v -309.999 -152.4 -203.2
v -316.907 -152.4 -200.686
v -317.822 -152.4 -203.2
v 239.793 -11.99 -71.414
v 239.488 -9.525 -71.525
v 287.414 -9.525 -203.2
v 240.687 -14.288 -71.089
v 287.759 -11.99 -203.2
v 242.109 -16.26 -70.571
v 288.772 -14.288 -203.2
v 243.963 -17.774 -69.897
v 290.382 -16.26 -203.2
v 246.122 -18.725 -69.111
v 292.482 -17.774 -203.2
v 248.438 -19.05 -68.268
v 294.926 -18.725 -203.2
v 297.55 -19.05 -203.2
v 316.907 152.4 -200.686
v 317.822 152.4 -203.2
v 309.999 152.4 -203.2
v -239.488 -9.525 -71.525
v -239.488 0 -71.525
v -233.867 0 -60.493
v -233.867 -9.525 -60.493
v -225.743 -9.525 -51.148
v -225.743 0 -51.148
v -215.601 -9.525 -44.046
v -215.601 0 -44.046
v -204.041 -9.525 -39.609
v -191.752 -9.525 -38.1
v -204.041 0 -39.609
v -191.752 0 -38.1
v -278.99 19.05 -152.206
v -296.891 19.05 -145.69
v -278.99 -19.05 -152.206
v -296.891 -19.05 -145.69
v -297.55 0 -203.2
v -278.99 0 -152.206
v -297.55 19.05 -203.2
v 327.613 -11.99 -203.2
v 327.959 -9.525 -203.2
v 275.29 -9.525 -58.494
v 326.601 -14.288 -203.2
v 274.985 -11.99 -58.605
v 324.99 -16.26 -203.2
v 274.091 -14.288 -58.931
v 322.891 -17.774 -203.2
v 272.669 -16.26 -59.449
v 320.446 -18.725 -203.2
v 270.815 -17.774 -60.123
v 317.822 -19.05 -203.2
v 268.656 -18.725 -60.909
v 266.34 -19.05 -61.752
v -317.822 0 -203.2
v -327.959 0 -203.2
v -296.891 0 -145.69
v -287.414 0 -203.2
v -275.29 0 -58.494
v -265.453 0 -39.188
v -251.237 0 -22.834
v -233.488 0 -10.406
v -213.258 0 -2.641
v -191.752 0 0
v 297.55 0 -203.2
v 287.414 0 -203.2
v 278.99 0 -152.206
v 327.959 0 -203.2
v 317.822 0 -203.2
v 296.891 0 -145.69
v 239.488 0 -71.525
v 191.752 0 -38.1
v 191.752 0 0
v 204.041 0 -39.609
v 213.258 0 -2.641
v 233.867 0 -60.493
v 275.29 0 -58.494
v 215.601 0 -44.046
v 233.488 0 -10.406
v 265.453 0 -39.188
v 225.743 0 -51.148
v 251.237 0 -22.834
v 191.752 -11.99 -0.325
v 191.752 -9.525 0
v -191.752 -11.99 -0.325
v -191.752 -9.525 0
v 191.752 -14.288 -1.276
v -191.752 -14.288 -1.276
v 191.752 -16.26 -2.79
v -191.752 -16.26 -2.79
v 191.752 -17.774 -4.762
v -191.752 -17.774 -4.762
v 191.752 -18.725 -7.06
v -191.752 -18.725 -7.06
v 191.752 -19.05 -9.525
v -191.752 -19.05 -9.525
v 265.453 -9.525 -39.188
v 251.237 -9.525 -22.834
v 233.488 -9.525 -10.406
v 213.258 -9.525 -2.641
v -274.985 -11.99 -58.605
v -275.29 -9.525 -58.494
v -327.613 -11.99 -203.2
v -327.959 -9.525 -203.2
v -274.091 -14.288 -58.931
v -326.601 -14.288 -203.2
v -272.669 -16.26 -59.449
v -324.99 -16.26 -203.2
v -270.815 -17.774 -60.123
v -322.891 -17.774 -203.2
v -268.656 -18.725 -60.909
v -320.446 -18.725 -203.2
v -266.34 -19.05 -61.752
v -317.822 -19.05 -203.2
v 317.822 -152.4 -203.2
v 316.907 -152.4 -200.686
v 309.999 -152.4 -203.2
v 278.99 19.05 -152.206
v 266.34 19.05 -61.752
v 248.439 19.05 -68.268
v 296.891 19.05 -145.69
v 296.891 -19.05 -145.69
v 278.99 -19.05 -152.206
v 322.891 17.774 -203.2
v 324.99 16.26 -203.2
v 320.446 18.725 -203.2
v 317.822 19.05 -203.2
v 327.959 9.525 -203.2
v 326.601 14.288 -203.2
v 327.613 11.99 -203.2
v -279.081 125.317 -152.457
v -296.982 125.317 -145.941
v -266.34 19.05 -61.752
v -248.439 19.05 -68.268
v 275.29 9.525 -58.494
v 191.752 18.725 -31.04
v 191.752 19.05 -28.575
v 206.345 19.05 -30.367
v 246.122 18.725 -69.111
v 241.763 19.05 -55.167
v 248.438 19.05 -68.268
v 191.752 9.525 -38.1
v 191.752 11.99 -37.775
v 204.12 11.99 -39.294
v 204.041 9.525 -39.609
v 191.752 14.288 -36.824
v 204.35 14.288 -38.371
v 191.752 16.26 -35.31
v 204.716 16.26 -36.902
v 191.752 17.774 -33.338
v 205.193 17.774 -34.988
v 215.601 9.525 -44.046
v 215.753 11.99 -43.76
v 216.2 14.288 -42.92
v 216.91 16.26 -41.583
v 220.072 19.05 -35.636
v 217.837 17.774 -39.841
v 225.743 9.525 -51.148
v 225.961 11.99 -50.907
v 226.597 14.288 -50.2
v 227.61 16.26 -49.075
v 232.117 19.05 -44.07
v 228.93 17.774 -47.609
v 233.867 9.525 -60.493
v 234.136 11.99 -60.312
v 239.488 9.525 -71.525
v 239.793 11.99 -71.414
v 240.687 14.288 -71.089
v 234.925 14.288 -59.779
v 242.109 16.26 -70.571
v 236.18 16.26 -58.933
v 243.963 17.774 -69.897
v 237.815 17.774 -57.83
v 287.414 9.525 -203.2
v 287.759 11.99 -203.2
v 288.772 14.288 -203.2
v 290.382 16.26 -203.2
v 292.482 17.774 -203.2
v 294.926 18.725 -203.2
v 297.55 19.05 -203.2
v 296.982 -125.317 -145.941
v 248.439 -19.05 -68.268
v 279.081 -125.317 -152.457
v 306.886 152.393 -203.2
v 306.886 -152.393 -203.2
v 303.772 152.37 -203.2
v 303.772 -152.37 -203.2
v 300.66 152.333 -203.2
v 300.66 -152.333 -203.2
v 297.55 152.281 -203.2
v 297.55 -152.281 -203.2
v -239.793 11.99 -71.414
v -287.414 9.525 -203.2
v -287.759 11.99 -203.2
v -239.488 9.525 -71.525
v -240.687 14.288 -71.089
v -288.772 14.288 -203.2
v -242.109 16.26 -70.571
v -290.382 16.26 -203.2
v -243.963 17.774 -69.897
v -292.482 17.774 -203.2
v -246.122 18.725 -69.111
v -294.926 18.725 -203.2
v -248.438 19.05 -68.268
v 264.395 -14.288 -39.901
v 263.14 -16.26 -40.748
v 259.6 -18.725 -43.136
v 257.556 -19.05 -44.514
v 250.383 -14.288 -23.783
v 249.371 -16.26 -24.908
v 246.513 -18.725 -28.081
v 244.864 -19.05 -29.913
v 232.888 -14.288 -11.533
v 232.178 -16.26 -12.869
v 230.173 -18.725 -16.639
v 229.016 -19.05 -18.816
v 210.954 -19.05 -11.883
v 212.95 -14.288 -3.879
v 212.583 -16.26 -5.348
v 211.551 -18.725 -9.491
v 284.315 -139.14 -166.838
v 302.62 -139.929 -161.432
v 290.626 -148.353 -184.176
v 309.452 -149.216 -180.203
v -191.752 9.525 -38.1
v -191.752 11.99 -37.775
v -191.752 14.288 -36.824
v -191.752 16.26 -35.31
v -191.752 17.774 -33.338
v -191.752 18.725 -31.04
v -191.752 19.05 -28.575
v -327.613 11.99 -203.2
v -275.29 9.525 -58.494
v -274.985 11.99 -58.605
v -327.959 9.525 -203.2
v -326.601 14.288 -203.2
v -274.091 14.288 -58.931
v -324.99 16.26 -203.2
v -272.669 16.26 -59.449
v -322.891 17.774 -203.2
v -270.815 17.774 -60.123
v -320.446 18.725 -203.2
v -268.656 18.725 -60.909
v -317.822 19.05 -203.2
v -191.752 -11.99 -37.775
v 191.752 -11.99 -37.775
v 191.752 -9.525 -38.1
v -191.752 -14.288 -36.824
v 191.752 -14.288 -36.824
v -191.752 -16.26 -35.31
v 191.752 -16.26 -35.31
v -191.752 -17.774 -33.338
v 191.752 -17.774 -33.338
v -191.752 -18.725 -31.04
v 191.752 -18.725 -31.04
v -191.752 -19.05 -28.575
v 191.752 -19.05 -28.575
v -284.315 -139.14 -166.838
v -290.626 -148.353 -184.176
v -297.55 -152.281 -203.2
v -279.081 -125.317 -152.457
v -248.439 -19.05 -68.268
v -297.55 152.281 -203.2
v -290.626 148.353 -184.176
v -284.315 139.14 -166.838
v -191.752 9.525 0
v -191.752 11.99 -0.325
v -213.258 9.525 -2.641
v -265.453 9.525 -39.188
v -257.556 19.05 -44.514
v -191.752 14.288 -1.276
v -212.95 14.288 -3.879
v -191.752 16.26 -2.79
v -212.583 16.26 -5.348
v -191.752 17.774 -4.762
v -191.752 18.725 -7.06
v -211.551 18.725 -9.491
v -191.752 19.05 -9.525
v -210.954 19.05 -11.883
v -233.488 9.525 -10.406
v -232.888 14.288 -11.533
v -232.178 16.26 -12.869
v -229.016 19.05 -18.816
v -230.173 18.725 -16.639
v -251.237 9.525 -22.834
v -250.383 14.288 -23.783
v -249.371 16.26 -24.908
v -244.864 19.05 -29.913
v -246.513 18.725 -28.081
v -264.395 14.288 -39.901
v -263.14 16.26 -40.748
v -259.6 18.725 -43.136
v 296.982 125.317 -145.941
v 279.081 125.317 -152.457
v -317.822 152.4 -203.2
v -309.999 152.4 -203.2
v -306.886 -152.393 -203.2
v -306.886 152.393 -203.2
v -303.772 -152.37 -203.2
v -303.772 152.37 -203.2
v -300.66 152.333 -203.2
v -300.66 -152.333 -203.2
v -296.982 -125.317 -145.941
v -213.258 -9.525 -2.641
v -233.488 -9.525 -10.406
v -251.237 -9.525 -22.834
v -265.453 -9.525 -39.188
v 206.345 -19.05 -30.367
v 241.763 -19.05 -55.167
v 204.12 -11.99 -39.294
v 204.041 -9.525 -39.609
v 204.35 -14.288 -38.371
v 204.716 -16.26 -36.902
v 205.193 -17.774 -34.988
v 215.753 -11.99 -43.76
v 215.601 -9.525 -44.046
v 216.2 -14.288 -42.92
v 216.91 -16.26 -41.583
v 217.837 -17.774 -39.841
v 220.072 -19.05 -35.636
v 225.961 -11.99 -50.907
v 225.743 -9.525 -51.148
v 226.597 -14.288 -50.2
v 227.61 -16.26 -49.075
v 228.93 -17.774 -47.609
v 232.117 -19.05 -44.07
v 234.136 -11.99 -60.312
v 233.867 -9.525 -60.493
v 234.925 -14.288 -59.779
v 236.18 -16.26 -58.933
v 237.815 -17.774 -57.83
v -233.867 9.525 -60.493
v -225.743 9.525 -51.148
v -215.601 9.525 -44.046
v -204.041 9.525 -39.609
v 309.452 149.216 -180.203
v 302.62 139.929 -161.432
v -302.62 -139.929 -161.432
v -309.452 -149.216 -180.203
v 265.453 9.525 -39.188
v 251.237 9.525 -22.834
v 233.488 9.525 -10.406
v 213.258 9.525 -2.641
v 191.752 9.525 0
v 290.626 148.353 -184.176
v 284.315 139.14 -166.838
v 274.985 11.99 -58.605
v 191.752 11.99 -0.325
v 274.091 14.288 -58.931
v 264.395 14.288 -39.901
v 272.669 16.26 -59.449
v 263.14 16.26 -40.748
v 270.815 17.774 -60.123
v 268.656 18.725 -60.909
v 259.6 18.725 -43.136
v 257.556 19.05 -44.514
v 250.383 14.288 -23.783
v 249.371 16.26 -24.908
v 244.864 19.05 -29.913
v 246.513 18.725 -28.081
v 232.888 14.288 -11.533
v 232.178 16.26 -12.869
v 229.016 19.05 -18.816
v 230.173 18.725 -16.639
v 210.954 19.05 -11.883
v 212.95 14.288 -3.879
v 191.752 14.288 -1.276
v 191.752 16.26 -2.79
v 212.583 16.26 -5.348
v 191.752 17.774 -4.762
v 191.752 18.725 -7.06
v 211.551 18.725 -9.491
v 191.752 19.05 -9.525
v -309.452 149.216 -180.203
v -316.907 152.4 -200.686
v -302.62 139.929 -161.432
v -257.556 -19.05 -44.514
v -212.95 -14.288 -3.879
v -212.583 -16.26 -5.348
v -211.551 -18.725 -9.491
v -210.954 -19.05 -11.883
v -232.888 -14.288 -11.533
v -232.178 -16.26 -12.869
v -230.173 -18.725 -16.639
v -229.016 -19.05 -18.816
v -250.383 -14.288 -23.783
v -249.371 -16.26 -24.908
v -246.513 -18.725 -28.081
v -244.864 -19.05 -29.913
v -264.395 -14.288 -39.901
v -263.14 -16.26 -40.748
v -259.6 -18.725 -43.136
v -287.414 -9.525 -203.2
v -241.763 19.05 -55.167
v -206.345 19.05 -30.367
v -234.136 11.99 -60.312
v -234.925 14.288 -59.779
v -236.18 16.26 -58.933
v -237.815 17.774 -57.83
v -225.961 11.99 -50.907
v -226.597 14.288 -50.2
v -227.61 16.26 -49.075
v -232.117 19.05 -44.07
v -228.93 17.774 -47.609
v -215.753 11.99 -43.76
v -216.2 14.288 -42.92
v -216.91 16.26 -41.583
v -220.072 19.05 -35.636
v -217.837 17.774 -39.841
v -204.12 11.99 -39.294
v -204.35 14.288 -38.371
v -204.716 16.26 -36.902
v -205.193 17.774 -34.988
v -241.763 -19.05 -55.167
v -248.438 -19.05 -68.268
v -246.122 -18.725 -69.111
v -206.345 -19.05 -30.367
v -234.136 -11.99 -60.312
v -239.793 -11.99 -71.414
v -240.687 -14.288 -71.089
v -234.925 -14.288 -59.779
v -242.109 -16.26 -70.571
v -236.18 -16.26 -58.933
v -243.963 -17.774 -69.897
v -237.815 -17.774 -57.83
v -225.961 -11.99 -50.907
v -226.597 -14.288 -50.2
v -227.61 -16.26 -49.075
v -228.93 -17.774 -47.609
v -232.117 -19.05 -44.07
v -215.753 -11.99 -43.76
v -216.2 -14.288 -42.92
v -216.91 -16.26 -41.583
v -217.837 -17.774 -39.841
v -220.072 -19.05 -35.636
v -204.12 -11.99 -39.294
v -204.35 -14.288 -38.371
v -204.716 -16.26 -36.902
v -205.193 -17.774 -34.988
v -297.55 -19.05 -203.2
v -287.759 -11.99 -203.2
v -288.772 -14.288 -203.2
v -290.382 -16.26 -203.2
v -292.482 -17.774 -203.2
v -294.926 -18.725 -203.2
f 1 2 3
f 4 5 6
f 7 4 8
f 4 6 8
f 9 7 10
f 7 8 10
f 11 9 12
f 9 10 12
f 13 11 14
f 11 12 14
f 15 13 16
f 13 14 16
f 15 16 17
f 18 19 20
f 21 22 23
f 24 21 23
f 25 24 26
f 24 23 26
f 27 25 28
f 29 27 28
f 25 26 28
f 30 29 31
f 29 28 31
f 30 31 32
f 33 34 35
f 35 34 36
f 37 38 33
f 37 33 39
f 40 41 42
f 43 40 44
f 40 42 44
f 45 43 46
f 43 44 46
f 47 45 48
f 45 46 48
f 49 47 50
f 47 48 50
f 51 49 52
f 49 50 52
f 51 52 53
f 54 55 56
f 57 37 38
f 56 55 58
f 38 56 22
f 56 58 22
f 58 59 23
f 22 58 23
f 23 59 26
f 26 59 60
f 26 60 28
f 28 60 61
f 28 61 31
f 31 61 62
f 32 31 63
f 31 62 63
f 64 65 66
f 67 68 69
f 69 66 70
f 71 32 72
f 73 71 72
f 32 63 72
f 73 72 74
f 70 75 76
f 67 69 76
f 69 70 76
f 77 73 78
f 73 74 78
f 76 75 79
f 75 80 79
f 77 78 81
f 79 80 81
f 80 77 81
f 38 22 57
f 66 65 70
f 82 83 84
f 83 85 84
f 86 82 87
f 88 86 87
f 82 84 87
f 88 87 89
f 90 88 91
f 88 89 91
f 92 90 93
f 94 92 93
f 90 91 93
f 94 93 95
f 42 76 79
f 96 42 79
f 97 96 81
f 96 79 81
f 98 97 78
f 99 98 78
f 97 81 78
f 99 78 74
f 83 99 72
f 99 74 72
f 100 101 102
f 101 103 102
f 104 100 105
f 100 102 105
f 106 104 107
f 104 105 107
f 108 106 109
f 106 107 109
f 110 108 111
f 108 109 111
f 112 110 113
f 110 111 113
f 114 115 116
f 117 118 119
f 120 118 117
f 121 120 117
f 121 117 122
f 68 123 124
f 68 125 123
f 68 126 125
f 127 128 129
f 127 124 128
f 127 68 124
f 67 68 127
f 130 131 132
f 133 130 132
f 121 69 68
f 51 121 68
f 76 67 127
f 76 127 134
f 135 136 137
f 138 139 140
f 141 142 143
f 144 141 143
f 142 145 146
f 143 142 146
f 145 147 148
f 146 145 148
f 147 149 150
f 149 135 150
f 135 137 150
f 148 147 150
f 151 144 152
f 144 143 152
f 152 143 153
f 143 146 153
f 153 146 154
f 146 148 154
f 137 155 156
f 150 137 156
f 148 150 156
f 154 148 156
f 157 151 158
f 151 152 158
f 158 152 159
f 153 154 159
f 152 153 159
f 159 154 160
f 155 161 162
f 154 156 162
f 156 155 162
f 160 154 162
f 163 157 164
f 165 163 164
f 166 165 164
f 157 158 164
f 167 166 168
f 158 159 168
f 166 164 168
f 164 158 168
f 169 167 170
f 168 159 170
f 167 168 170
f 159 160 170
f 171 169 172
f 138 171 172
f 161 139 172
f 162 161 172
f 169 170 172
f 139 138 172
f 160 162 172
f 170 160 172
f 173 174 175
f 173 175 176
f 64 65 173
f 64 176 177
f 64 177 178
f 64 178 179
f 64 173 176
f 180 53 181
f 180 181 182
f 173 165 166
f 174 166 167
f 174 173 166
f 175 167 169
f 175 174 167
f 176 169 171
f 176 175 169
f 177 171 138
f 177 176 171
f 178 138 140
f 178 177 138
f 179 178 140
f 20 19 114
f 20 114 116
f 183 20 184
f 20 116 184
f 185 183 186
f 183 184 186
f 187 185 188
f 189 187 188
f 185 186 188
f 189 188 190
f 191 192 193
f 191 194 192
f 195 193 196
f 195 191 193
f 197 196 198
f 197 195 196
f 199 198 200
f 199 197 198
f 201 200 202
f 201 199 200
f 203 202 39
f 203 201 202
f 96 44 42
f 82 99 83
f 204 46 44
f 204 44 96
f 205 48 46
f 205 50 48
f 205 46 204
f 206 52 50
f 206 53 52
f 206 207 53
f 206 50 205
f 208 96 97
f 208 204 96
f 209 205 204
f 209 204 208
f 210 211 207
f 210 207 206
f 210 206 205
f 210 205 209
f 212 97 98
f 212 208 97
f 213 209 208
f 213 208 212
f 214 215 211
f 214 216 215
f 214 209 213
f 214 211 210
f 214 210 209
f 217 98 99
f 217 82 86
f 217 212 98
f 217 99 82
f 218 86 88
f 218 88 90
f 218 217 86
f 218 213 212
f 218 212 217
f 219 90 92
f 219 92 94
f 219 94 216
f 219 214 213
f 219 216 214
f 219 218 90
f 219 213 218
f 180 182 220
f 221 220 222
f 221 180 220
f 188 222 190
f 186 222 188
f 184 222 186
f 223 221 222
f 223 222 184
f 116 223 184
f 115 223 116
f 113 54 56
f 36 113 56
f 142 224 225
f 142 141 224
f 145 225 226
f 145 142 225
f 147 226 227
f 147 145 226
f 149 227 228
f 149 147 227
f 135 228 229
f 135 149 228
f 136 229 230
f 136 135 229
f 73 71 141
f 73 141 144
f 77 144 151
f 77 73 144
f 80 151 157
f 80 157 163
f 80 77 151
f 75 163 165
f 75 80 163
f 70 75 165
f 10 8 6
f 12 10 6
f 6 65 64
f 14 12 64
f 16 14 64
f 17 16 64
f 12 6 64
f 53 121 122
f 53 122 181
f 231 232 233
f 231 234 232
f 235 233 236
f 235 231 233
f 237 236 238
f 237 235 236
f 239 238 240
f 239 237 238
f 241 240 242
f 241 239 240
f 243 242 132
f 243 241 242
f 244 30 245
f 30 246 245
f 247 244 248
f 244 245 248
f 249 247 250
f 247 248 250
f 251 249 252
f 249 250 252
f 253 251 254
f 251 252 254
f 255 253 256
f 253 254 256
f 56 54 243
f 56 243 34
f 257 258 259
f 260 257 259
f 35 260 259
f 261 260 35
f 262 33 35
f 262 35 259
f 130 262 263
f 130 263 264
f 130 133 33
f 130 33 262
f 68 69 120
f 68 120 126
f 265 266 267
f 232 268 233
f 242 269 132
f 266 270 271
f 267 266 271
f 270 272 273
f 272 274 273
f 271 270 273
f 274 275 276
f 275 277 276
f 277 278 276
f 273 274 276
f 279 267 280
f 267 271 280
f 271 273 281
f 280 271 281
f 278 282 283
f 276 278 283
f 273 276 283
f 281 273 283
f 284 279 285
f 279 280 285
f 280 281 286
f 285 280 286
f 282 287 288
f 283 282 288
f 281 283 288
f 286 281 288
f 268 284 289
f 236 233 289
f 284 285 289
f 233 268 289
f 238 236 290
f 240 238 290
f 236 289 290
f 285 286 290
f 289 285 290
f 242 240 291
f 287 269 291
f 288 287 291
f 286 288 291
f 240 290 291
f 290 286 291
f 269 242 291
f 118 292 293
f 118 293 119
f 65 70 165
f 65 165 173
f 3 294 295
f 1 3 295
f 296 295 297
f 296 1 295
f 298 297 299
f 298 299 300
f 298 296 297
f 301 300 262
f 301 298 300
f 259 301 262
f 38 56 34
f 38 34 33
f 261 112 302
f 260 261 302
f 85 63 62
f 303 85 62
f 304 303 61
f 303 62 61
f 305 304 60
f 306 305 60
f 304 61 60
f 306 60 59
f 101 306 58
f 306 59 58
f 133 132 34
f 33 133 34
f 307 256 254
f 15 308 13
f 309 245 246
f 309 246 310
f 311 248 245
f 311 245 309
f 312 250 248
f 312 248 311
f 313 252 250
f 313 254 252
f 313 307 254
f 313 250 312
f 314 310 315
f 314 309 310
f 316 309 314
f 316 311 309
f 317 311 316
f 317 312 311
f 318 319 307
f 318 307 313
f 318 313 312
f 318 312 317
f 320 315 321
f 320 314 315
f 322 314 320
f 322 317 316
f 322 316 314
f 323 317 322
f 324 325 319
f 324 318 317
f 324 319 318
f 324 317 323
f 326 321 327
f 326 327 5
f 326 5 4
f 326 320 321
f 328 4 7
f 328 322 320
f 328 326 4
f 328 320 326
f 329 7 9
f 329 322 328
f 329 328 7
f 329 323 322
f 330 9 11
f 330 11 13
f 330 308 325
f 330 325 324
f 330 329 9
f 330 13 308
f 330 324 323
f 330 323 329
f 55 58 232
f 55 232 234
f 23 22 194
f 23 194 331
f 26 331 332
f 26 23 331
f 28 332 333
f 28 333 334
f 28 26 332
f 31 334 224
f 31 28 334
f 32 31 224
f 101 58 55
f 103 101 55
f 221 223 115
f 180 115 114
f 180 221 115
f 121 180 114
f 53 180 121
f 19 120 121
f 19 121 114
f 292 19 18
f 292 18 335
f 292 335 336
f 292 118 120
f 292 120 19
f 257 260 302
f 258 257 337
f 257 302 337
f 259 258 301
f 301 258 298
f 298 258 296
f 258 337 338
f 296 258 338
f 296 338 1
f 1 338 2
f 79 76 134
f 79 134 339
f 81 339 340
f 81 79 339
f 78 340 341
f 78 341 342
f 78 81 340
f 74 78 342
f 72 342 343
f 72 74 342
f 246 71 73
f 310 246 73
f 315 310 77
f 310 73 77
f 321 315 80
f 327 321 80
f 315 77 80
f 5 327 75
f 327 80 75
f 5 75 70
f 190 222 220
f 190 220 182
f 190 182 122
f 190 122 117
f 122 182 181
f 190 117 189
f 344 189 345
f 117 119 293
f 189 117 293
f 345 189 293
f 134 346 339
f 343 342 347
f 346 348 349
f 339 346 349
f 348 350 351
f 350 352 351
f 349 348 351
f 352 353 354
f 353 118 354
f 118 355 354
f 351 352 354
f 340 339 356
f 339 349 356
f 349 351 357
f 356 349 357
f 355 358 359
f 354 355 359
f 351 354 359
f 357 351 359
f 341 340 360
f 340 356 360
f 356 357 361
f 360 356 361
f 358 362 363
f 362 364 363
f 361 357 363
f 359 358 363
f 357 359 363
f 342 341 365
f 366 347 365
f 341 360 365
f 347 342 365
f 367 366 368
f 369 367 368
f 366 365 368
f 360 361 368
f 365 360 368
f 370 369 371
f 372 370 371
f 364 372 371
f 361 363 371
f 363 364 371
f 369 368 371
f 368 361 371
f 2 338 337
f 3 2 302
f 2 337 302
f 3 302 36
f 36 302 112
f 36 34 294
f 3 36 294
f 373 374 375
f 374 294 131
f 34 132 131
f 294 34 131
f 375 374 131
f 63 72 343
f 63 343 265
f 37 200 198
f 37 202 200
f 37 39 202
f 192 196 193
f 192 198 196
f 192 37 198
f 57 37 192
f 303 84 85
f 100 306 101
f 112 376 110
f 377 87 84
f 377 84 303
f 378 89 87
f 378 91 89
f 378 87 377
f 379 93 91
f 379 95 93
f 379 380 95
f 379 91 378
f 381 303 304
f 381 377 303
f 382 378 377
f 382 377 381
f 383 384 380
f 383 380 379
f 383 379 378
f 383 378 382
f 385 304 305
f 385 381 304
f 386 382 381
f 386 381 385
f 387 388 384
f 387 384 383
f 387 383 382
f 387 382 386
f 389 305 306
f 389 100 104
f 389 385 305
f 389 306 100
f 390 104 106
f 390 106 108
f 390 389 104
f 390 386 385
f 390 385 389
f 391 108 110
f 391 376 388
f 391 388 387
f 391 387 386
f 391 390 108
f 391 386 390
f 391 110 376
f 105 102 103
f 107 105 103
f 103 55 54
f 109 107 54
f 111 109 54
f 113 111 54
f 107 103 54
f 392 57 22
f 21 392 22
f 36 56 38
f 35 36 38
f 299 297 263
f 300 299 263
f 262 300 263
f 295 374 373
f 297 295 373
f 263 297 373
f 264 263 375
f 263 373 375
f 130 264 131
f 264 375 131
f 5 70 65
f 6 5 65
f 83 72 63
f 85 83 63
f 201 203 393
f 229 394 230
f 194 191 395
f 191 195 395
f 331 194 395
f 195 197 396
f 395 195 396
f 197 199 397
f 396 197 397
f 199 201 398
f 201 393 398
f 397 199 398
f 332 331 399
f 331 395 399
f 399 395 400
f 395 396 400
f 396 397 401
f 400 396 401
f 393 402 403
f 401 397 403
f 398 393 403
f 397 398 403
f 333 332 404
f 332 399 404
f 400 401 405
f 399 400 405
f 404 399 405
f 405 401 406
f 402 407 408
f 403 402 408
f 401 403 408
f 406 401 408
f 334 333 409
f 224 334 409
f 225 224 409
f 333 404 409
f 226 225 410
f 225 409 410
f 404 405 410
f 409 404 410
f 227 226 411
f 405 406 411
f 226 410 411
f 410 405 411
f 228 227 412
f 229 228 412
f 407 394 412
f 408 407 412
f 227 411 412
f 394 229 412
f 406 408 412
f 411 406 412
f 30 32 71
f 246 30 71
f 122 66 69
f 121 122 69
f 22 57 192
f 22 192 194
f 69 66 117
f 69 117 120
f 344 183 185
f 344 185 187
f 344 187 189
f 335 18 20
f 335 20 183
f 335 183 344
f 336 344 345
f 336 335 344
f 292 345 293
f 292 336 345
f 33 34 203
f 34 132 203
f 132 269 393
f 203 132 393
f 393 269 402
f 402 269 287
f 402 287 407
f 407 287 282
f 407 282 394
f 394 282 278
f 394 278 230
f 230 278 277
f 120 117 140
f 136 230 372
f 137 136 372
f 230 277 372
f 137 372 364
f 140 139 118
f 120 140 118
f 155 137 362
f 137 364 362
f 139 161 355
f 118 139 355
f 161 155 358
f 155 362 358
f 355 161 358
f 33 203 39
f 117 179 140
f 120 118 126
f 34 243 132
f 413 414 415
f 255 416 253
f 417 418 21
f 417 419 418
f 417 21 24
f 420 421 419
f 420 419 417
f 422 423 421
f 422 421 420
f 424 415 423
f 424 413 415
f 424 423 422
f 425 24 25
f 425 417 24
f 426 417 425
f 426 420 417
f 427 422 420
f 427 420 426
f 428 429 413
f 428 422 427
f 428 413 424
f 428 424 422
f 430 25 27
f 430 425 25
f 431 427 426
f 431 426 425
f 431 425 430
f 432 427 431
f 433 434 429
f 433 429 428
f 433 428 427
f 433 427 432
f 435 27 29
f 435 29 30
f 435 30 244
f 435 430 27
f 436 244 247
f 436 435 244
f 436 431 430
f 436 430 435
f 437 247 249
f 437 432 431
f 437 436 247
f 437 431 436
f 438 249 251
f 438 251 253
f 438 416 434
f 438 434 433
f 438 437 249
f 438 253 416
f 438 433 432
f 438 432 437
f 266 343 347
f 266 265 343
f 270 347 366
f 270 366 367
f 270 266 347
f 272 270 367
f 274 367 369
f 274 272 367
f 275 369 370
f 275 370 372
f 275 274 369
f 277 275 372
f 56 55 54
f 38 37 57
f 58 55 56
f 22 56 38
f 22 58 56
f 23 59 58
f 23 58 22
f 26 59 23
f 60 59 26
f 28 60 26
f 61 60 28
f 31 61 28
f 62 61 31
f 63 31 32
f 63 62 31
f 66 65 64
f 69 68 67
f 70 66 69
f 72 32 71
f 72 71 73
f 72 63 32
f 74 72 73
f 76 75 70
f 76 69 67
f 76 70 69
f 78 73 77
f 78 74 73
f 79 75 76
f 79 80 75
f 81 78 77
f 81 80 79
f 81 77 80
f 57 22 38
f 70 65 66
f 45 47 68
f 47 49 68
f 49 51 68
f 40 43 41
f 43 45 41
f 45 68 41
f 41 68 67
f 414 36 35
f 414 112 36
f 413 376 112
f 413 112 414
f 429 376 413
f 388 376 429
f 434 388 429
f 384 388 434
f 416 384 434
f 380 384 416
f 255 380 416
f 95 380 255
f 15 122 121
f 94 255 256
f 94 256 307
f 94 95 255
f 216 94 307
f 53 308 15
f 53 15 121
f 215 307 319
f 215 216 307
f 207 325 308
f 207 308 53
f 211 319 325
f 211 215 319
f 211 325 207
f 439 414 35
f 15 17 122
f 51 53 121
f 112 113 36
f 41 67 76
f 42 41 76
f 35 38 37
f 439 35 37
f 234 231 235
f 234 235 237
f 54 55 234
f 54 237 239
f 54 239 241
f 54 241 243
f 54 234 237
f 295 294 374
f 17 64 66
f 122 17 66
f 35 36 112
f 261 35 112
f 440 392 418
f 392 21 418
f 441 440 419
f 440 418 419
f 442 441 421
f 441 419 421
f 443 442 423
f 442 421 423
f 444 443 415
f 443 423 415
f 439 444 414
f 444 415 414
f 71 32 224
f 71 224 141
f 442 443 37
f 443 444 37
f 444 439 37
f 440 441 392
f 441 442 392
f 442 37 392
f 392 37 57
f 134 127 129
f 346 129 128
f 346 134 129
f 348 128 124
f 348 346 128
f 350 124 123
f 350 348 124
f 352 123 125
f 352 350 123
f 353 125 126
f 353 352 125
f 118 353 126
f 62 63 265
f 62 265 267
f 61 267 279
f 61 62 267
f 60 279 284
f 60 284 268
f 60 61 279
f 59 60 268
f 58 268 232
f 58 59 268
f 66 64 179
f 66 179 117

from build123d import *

# Parameters (mm, degrees)
F1_DEPTH = 19.05
F2_DEPTH = 19.05
F3_R     = 9.52499
F3_2_R   = 9.52499
F4_W     = 19.05
F4_H     = 61.2004494442
F5_DEPTH = 19.05
F6_W     = 154.725164175
F6_H     = 323.0141699314
F7_DEPTH = 25.4


# Not quite as in the source:
# - a fillet or chamfer is up to 0.001 mm smaller than in the source, because OpenCascade refuses the exact size


with BuildPart() as f1:
    # F0 (on Front) → F1 (new body)
    with BuildSketch(Plane.XZ):
        with BuildLine():
            Line((191.7515498532, 0), (0, 0))
            Line((0, 0), (-191.7515498532, 0))
            ThreePointArc((-191.7515498532, 0), (-242.7424950448, -16.0773832627), (-275.290223841, -58.4944092583))
            Line((-275.290223841, -58.4944092583), (-327.9587516029, -203.2))
            Line((-327.9587516029, -203.2), (-317.8224583201, -203.2))
            Line((-317.8224583201, -203.2), (-296.8906718296, -145.6903892685))
            Line((-296.8906718296, -145.6903892685), (-278.9895274036, -152.2058729989))
            Line((-278.9895274036, -152.2058729989), (-297.5498717544, -203.2))
            Line((-297.5498717544, -203.2), (-287.4135784716, -203.2))
            Line((-287.4135784716, -203.2), (-239.4879349891, -71.5253767191))
            ThreePointArc((-239.4879349891, -71.5253767191), (-220.8892328198, -47.2870761501), (-191.7515498532, -38.1))
            Line((-191.7515498532, -38.1), (0, -38.1))
            Line((0, -38.1), (191.7515498532, -38.1))
            ThreePointArc((191.7515498532, -38.1), (220.8892328198, -47.2870761501), (239.4879349891, -71.5253767191))
            Line((239.4879349891, -71.5253767191), (287.4135784716, -203.2))
            Line((287.4135784716, -203.2), (297.5498717544, -203.2))
            Line((297.5498717544, -203.2), (278.9895274036, -152.2058729989))
            Line((278.9895274036, -152.2058729989), (296.8906718296, -145.6903892685))
            Line((296.8906718296, -145.6903892685), (317.8224583201, -203.2))
            Line((317.8224583201, -203.2), (327.9587516029, -203.2))
            Line((327.9587516029, -203.2), (275.290223841, -58.4944092583))
            ThreePointArc((275.290223841, -58.4944092583), (242.7424950448, -16.0773832627), (191.7515498532, 0))
        make_face()
    extrude(amount=F1_DEPTH)

    # F3 (radius 9.525 in the source; OpenCascade refuses exactly that, so slightly less here)
    f3_edges = [f1.edges().sort_by_distance(p)[0] for p in [
        (0, -19.05, 0),
        (-242.742495, -19.05, -16.077383),
        (0, -19.05, -38.1),
        (-220.889233, -19.05, -47.287076),
        (220.889233, -19.05, -47.287076),
        (242.742495, -19.05, -16.077383),
    ]]
    fillet(f3_edges, radius=F3_R)


with BuildPart() as f2:
    # F0 (on Front) → F2 (new body)
    with BuildSketch(Plane.XZ):
        with BuildLine():
            Line((191.7515498532, 0), (0, 0))
            Line((0, 0), (-191.7515498532, 0))
            ThreePointArc((-191.7515498532, 0), (-242.7424950448, -16.0773832627), (-275.290223841, -58.4944092583))
            Line((-275.290223841, -58.4944092583), (-327.9587516029, -203.2))
            Line((-327.9587516029, -203.2), (-317.8224583201, -203.2))
            Line((-317.8224583201, -203.2), (-296.8906718296, -145.6903892685))
            Line((-296.8906718296, -145.6903892685), (-278.9895274036, -152.2058729989))
            Line((-278.9895274036, -152.2058729989), (-297.5498717544, -203.2))
            Line((-297.5498717544, -203.2), (-287.4135784716, -203.2))
            Line((-287.4135784716, -203.2), (-239.4879349891, -71.5253767191))
            ThreePointArc((-239.4879349891, -71.5253767191), (-220.8892328198, -47.2870761501), (-191.7515498532, -38.1))
            Line((-191.7515498532, -38.1), (0, -38.1))
            Line((0, -38.1), (191.7515498532, -38.1))
            ThreePointArc((191.7515498532, -38.1), (220.8892328198, -47.2870761501), (239.4879349891, -71.5253767191))
            Line((239.4879349891, -71.5253767191), (287.4135784716, -203.2))
            Line((287.4135784716, -203.2), (297.5498717544, -203.2))
            Line((297.5498717544, -203.2), (278.9895274036, -152.2058729989))
            Line((278.9895274036, -152.2058729989), (296.8906718296, -145.6903892685))
            Line((296.8906718296, -145.6903892685), (317.8224583201, -203.2))
            Line((317.8224583201, -203.2), (327.9587516029, -203.2))
            Line((327.9587516029, -203.2), (275.290223841, -58.4944092583))
            ThreePointArc((275.290223841, -58.4944092583), (242.7424950448, -16.0773832627), (191.7515498532, 0))
        make_face()
    extrude(amount=-F2_DEPTH)

    # F3#2 (radius 9.525 in the source; OpenCascade refuses exactly that, so slightly less here)
    f3_2_edges = [f2.edges().sort_by_distance(p)[0] for p in [
        (-242.742495, 19.05, -16.077383),
        (0, 19.05, 0),
        (242.742495, 19.05, -16.077383),
        (220.889233, 19.05, -47.287076),
        (0, 19.05, -38.1),
    ]]
    fillet(f3_2_edges, radius=F3_2_R)


with BuildPart() as f5:
    # F4 (on face) → F5 (new body)
    with BuildSketch(Plane(origin=(-215.3370720631, 0, 78.376284565), x_dir=(0, 1, 0), z_dir=(0.9396926208, 0, -0.3420201433))):
        with Locations((9.525, -269.0469985684)):
            Rectangle(F4_W, F4_H)
        with Locations((-9.525, -269.0469985684)):
            Rectangle(F4_W, F4_H)
        with BuildLine():
            Line((-152.4, -296.9716030201), (-152.4, -299.6472232904))
            Line((-152.4, -299.6472232904), (-19.05, -299.6472232904))
            Line((-19.05, -299.6472232904), (-19.05, -238.4467738463))
            Line((-19.05, -238.4467738463), (-19.05, -149.1215665516))
            Line((-19.05, -149.1215665516), (-125.3166007179, -238.7135603657))
            ThreePointArc((-125.3166007179, -238.7135603657), (-145.2982090025, -264.8487527006), (-152.4, -296.9716030201))
        make_face()
        with BuildLine():
            Line((19.05, -238.4467738463), (19.05, -299.6472232904))
            Line((19.05, -299.6472232904), (152.4, -299.6472232904))
            Line((152.4, -299.6472232904), (152.4, -296.9716030201))
            ThreePointArc((152.4, -296.9716030201), (145.2982090025, -264.8487527006), (125.3166007179, -238.7135603657))
            Line((125.3166007179, -238.7135603657), (19.05, -149.1215665516))
            Line((19.05, -149.1215665516), (19.05, -238.4467738463))
        make_face()
    extrude(amount=F5_DEPTH)

    # F6 (on face) → F7 (cut)
    with BuildSketch(Plane(origin=(0, 0, -203.2), x_dir=(1, 0, 0), z_dir=(0, 0, -1))):
        with Locations((-313.482388854, -5.5776387453)):
            Rectangle(F6_W, F6_H)
    extrude(amount=F7_DEPTH, mode=Mode.SUBTRACT)


with BuildPart() as f8_1:
    # F8: instance of F5
    add(f5.part.mirror(Plane.YZ))


solid = Compound([f1.part, f2.part, f5.part, f8_1.part])
